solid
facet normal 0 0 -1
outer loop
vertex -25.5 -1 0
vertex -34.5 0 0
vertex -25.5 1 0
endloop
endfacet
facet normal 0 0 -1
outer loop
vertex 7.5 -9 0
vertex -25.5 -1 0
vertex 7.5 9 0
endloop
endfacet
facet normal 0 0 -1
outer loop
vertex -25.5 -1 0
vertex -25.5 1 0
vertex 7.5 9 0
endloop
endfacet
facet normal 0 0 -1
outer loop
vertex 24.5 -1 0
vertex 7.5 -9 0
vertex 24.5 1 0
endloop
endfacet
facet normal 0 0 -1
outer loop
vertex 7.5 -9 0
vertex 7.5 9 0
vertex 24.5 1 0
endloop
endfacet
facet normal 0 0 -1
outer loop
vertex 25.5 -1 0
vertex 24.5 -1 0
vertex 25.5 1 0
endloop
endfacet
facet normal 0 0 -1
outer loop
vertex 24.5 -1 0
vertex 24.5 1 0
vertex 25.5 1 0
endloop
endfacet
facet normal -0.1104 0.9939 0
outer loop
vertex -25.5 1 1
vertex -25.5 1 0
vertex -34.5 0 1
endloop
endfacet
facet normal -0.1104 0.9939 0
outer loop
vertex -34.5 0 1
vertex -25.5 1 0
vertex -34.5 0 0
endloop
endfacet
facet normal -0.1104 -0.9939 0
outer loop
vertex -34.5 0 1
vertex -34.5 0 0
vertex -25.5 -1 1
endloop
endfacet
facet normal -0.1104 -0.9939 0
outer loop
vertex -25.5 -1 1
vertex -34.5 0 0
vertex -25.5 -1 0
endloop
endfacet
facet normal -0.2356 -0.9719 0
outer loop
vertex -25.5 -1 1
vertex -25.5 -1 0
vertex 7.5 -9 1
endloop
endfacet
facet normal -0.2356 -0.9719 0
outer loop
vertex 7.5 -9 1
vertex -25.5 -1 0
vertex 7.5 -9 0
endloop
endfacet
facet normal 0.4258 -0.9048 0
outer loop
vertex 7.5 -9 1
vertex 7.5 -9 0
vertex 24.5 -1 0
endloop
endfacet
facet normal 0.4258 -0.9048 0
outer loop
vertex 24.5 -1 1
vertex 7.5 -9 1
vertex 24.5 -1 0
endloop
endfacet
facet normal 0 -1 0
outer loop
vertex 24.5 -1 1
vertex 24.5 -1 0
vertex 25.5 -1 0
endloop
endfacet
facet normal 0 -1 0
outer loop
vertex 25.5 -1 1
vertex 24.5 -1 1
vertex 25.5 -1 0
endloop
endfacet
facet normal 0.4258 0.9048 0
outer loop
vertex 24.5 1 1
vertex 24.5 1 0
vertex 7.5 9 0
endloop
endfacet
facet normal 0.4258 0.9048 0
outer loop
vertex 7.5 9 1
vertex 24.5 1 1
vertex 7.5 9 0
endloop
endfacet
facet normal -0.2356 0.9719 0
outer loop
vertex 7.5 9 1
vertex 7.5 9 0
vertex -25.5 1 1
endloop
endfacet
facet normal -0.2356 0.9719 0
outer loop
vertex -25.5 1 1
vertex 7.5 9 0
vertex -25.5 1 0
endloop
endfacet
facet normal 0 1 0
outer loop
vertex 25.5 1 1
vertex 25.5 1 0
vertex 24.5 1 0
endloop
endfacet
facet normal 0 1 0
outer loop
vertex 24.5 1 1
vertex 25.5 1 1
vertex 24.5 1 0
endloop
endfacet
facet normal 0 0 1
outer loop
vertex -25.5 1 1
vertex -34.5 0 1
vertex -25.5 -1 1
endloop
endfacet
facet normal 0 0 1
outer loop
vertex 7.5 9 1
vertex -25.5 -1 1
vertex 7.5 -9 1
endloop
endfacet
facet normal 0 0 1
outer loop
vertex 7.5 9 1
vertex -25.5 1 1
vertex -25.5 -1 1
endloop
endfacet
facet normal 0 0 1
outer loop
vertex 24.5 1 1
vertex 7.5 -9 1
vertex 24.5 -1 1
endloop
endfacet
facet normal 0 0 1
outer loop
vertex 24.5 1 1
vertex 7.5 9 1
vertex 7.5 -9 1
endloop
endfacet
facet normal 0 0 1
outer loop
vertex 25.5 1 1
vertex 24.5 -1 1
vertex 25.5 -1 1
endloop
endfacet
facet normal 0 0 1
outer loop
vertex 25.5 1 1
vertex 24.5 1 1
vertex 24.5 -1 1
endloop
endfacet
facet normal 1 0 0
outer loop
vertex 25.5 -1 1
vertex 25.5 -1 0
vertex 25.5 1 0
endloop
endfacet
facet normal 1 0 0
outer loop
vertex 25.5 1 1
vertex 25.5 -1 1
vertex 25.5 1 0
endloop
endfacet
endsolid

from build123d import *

# Parameters (mm, degrees)
F0_W     = 9.6744340956
F0_H     = 1
F1_DEPTH = 1


# Not quite as in the source:
# - a feature names something its author has since deleted; it is built from what else it names


with BuildPart() as f1:
    # F0 (on Top) → F1 (new body)
    with BuildSketch(Plane.XY):
        with Locations((-20.6627829522, 0.5)):
            Rectangle(F0_W, F0_H)
        Polygon((-34.5, 0), (-25.5, 0), (-25.5, 1), align=None)
        Polygon((-15.8255659044, 0), (-25.5, 0), (-25.5, -1), (24.5, -1), (25.5, -1), (25.5, 0), align=None)
        Polygon((-25.5, -1), (-25.5, 0), (-34.5, 0), align=None)
        Polygon((-15.8255659044, 1), (-15.8255659044, 0), (25.5, 0), (25.5, 1), (24.5, 1), align=None)
        with BuildLine():
            add(Edge.make_bspline(
                [(-25.5, 1), (-14.5003329962, 3.3801647369), (-13.2050132379, 2.5), (7.5, 3)],
                knots=[0, 0, 0, 0, 33.0605505096, 33.0605505096, 33.0605505096, 33.0605505096], degree=3))
            Line((-25.5, 1), (-15.8255659044, 1))
            Line((-15.8255659044, 1), (24.5, 1))
            add(Edge.make_bspline(
                [(7.5, 3), (14.1289979219, 2.5626332499), (18.8218969852, 1.9759975839), (24.5, 1)],
                knots=[0, 0, 0, 0, 17.1172427686, 17.1172427686, 17.1172427686, 17.1172427686], degree=3))
        make_face()
        with BuildLine():
            Line((7.5, 9), (-25.5, 1))
            add(Edge.make_bspline(
                [(-25.5, 1), (-14.5003329962, 3.3801647369), (-13.2050132379, 2.5), (7.5, 3)],
                knots=[0, 0, 0, 0, 33.0605505096, 33.0605505096, 33.0605505096, 33.0605505096], degree=3))
            add(Edge.make_bspline(
                [(7.5, 3), (14.1289979219, 2.5626332499), (18.8218969852, 1.9759975839), (24.5, 1)],
                knots=[0, 0, 0, 0, 17.1172427686, 17.1172427686, 17.1172427686, 17.1172427686], degree=3))
            Line((24.5, 1), (7.5, 9))
        make_face()
        with BuildLine():
            add(Edge.make_bspline(
                [(-25.5, -1), (-14.5003329962, -3.3801647369), (-13.2050132379, -2.5), (7.5, -3)],
                knots=[0, 0, 0, 0, 33.0605505096, 33.0605505096, 33.0605505096, 33.0605505096], degree=3))
            Line((-25.5, -1), (7.5, -9))
            Line((7.5, -9), (24.5, -1))
            add(Edge.make_bspline(
                [(7.5, -3), (14.1289979219, -2.5626332499), (18.8218969852, -1.9759975839), (24.5, -1)],
                knots=[0, 0, 0, 0, 17.1172427686, 17.1172427686, 17.1172427686, 17.1172427686], degree=3))
        make_face()
        with BuildLine():
            Line((24.5, -1), (-25.5, -1))
            add(Edge.make_bspline(
                [(-25.5, -1), (-14.5003329962, -3.3801647369), (-13.2050132379, -2.5), (7.5, -3)],
                knots=[0, 0, 0, 0, 33.0605505096, 33.0605505096, 33.0605505096, 33.0605505096], degree=3))
            add(Edge.make_bspline(
                [(7.5, -3), (14.1289979219, -2.5626332499), (18.8218969852, -1.9759975839), (24.5, -1)],
                knots=[0, 0, 0, 0, 17.1172427686, 17.1172427686, 17.1172427686, 17.1172427686], degree=3))
        make_face()
    extrude(amount=F1_DEPTH)


solid = f1.part
